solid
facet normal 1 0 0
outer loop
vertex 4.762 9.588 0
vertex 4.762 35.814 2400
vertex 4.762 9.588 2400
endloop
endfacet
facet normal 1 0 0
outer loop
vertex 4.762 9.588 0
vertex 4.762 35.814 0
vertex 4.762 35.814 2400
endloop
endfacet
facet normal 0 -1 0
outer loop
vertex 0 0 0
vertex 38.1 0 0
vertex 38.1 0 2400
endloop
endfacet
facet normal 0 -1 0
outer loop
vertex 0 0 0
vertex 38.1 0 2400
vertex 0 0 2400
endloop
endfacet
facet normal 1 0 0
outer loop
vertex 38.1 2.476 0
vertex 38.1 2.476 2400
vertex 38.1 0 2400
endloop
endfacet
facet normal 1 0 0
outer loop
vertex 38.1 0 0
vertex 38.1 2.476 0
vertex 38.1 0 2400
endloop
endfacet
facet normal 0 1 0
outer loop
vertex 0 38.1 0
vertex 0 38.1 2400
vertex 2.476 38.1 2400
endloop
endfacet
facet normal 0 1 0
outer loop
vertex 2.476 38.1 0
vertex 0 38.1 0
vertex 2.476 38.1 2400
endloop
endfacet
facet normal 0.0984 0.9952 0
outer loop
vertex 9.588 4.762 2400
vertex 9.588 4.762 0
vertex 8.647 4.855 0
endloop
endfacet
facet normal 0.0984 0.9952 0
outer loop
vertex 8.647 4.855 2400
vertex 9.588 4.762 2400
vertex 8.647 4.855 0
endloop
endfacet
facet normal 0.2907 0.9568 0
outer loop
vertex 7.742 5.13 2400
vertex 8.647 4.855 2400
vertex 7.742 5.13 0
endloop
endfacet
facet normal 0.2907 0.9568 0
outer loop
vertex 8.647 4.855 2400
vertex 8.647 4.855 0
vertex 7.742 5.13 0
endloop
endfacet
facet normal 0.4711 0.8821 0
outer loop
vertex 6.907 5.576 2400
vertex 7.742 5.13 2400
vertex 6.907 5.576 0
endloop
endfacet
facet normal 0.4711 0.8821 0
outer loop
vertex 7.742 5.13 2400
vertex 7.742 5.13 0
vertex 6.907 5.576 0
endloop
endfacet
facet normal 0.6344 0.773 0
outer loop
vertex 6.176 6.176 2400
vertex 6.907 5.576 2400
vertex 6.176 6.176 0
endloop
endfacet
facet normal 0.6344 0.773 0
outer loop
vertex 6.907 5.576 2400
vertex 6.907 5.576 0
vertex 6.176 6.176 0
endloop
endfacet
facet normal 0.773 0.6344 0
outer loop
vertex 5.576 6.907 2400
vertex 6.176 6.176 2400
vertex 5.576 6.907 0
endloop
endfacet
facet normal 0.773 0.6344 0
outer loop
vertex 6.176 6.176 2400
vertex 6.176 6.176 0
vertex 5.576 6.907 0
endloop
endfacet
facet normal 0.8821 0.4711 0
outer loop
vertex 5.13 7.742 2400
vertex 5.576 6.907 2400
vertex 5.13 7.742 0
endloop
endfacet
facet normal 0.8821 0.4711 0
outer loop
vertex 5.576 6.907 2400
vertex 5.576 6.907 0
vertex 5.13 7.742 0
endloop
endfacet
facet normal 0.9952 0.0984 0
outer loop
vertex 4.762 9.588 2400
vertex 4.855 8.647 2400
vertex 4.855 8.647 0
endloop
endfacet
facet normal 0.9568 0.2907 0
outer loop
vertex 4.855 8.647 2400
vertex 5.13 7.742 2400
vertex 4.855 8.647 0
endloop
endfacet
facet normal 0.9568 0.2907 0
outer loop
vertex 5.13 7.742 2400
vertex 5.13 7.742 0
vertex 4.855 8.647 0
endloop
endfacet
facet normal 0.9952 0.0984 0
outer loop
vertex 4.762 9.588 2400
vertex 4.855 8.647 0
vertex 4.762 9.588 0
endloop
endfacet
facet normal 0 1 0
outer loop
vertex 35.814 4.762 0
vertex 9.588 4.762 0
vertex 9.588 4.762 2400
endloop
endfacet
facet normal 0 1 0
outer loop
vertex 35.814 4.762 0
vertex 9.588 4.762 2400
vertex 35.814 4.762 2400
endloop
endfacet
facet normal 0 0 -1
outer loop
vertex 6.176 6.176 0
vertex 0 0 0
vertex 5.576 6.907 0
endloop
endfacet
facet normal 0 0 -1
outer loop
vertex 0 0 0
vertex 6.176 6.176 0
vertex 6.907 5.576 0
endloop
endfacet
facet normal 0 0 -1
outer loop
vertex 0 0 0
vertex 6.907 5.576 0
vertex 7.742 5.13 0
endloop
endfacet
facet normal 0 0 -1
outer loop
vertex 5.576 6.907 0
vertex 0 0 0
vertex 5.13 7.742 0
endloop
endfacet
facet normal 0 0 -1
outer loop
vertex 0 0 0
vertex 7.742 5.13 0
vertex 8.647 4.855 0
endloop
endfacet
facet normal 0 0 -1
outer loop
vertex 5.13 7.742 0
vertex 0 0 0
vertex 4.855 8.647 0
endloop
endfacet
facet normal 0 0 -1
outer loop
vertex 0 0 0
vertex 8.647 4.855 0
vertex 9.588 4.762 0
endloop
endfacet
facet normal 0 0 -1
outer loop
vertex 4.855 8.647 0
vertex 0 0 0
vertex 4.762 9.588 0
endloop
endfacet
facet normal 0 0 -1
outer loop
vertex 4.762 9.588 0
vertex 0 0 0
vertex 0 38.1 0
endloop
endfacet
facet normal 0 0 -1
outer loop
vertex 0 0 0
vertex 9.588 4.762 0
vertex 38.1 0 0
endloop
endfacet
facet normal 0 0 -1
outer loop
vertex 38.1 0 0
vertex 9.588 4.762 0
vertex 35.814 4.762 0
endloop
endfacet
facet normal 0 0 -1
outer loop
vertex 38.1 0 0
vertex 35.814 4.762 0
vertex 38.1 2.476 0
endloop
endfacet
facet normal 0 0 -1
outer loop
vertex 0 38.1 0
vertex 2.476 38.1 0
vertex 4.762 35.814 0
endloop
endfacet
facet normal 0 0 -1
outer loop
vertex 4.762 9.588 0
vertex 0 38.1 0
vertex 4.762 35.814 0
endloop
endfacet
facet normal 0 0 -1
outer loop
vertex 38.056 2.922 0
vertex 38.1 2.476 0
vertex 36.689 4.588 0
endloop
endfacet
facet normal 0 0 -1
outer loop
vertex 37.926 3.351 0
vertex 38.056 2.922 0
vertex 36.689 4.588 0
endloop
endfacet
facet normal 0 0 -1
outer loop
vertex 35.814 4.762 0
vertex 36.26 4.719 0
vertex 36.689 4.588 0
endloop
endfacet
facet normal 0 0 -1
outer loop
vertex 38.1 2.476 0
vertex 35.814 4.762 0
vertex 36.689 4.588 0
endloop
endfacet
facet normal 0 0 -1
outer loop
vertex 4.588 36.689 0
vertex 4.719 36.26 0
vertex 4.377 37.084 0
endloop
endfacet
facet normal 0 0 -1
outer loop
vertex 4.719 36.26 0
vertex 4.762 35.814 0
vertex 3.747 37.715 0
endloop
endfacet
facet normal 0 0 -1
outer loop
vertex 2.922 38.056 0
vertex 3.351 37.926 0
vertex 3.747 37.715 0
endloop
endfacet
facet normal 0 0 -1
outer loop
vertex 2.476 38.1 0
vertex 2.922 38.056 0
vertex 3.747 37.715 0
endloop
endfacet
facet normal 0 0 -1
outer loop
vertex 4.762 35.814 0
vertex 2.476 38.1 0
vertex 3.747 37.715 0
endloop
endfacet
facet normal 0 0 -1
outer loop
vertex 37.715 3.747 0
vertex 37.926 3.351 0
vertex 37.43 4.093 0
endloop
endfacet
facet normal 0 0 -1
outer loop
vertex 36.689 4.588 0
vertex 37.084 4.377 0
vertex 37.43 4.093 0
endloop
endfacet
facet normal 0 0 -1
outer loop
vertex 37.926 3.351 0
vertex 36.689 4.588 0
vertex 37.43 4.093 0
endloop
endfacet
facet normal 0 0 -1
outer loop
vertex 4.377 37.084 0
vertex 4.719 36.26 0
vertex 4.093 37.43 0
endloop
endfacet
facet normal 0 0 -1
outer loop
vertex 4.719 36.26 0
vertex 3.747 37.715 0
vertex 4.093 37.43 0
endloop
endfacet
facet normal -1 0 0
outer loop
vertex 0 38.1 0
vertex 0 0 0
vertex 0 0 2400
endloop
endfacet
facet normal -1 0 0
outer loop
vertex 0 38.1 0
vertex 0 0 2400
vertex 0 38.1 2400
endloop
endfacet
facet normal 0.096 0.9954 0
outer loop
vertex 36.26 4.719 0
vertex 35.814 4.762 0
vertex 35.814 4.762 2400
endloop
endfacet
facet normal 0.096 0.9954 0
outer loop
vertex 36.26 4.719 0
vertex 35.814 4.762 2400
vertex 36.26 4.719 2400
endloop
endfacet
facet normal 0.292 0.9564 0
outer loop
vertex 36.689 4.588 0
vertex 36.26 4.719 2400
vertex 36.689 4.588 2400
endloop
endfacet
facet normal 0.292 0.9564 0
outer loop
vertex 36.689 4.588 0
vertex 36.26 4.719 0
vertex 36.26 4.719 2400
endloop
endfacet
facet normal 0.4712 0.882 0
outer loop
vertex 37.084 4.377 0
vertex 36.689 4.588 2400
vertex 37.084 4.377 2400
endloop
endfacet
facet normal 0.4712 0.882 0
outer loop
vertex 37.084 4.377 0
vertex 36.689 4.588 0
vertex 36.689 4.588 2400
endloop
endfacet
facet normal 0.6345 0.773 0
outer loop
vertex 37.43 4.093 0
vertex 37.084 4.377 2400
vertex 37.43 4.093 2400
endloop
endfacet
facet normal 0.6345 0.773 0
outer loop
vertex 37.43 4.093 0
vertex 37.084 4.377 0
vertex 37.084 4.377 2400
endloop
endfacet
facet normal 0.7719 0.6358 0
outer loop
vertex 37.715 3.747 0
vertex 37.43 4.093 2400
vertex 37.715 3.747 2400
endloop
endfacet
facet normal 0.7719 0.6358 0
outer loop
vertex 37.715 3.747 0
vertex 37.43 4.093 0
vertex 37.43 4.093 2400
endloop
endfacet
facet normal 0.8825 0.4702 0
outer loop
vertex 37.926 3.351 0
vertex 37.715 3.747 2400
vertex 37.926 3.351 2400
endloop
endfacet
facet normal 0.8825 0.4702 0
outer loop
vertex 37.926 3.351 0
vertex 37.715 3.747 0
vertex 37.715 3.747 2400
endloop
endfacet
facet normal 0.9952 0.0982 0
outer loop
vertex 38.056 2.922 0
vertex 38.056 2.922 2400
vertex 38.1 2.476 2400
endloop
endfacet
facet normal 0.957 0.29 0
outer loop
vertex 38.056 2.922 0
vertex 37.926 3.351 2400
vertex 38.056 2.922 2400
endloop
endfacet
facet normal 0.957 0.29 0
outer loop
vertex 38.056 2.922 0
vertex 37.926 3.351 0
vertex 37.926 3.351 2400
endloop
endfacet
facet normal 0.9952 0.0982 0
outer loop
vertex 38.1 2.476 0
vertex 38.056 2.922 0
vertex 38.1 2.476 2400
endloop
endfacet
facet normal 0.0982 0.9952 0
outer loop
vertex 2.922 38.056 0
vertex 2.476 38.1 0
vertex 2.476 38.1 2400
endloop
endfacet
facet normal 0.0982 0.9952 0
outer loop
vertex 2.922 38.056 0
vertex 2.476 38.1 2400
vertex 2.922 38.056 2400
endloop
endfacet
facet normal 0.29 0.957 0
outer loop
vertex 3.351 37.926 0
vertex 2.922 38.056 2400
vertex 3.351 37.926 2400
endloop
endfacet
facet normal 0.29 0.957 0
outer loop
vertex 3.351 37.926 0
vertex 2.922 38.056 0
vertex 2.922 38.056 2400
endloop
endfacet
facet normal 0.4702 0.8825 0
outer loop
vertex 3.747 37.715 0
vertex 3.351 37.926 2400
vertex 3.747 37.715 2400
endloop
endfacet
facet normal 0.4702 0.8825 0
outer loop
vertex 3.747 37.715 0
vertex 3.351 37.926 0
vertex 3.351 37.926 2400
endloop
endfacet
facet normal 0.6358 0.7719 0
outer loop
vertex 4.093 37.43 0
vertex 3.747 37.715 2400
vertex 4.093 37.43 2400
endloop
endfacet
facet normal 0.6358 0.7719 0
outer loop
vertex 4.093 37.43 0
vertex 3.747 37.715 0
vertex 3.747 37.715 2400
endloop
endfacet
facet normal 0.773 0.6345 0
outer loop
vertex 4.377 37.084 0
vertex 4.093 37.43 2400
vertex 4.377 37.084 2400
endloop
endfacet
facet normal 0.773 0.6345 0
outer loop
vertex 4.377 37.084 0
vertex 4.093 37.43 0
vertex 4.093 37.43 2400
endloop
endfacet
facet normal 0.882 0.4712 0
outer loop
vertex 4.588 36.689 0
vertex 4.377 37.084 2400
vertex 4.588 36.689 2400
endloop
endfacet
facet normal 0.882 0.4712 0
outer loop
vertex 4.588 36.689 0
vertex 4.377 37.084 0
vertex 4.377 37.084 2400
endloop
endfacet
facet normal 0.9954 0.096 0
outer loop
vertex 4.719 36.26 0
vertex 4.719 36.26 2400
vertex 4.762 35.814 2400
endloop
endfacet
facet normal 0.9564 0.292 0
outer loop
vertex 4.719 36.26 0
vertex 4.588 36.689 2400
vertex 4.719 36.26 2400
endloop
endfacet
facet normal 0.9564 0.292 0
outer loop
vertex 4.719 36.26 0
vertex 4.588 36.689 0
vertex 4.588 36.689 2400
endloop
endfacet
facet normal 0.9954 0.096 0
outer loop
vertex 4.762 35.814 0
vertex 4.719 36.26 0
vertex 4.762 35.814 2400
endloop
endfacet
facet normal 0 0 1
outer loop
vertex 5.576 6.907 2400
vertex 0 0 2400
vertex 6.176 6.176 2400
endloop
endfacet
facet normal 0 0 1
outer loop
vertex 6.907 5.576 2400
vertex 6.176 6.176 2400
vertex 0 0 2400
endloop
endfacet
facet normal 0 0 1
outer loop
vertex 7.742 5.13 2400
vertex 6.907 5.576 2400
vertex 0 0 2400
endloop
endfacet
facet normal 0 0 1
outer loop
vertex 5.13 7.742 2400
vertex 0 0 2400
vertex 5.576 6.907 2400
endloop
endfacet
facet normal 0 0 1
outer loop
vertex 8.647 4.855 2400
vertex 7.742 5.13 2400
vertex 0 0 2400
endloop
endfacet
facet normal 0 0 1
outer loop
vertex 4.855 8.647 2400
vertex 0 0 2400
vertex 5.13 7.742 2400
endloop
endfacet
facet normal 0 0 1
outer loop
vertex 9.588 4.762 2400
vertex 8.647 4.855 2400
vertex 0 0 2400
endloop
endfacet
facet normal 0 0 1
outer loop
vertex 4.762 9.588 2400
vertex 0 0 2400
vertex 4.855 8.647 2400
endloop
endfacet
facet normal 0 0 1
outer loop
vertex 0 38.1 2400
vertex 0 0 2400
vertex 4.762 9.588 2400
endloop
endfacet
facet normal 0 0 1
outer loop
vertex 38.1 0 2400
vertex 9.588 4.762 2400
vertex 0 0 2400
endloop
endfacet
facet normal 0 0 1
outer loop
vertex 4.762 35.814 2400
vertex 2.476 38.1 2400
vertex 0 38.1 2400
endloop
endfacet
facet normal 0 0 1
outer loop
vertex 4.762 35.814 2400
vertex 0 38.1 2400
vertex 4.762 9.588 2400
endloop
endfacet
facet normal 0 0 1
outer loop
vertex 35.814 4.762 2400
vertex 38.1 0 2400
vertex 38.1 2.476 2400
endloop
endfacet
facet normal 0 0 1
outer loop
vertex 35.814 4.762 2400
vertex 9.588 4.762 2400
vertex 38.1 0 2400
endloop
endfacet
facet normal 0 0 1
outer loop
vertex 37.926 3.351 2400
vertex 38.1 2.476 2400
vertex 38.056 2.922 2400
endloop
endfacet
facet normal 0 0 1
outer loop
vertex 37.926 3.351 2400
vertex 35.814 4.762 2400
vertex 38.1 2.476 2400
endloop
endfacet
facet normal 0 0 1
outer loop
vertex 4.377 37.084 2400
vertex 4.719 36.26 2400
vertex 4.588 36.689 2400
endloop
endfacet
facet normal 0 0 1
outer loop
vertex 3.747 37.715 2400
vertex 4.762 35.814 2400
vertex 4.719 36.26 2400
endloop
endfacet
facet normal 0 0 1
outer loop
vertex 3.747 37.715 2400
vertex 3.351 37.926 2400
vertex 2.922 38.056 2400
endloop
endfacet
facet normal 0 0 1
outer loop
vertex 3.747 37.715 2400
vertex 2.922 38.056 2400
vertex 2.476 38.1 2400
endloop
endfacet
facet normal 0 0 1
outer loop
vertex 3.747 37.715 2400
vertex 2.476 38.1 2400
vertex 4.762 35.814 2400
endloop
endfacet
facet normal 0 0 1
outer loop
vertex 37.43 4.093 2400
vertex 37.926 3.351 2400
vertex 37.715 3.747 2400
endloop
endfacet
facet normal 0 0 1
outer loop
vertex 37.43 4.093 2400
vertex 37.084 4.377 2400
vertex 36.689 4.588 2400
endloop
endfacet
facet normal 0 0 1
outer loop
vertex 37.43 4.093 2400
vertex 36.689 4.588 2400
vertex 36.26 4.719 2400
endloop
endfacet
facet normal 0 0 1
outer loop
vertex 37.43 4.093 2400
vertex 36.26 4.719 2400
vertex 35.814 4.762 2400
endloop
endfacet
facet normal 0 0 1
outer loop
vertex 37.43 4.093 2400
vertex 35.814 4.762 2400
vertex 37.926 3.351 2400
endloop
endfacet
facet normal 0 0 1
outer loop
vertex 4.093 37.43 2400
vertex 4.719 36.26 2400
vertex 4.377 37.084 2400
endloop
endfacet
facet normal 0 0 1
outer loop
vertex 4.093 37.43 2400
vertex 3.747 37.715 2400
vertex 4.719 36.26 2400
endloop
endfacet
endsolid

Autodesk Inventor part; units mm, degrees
ref_plane "Plano inicial" through (0, 0, 0) normal (0, 0, 1) x (1, 0, 0)
ref_plane "Plano final" through (0, 0, 2400) normal (0, 0, 1) x (1, 0, 0)
sketch "Boceto" plane through (0, 0, 0) normal (0, 0, 1) x (1, 0, 0)
  line L0 (38.1, 0) -> (0, 0)
  line L1 (0, 0) -> (0, 38.1)
  line L2 (0, 38.1) -> (2.4765, 38.1)
  line L3 (4.7625, 35.814) -> (4.7625, 9.5885)
  line L4 (9.5885, 4.7625) -> (35.814, 4.7625)
  line L5 (38.1, 2.4765) -> (38.1, 0)
  line L6 (0, -11.0414) -> (0, 31.5385) construction
  line L7 (-11.0414, 0) -> (31.5385, 0) construction
  arc A0 (4.7625, 9.5885) -> (9.5885, 4.7625) centre (9.5885, 9.5885) ccw
  arc A1 (4.7625, 35.814) -> (2.4765, 38.1) centre (2.4765, 35.814) ccw
  arc A2 (38.1, 2.4765) -> (35.814, 4.7625) centre (35.814, 2.4765) ccw
  line L8 (0, 48.4964) -> (0, -20.9644) construction
  line L9 (-20.9644, 0) -> (48.4964, 0) construction
  point P0 (4.7625, 38.1)
  point P1 (4.7625, 4.7625)
  point P2 (38.1, 4.7625)
  dimension "d0" = 38.1
  dimension "d1" = 38.1
  dimension "d2" = 4.7625
  dimension "d3" = 4.7625
  dimension "d10" = 0
  dimension "d11" = 0
  dimension "d14" = 4.826
  dimension "d15" = 2.286
extrude "Cuerpo" add sketch "Boceto" along normal up to surface (2400 mm away) from surface at 0
sketch "Sketch3" plane through (0, 0, 0) normal (0, 0, 1) x (1, 0, 0)
  line L0 (0, 0) -> (10, 0)
ref_plane "Work Plane3" through (0, 0, 0) normal (0, -1, 0) x (1, 0, 0)
sketch "Sketch4" plane through (0, 0, 0) normal (0, -1, 0) x (1, 0, 0)
  line L0 (-2, 0) -> (12, 0)
  line L1 (-2, 2400) -> (12, 2400)
  dimension "d17" = 2400
sketch "Boceto5" plane through (0, 0, 2400) normal (0, 0, 1) x (1, 0, 0)
  line L0 (0, 0) -> (0, 38.1) projected
  circle A0 centre (0, 0) radius 57.437
ref_plane "Plano de trabajo4" through (4.8672, 4.8672, 1401) normal (0, 0, 1) x (1, 0, 0)
equation "\"d0\" = G_H"
equation "\"d1\" = G_H"
equation "\"d2\" = G_T"
equation "\"d3\" = G_T"
equation "\"d14\" = G_IR"
equation "\"d15\" = G_ER"
equation "\"d4\" = G_L"
equation "\"G_H\" = 38.1"
equation "\"G_T\" = 4.7625"
equation "\"G_ER\" = 2.286"
equation "\"G_IR\" = 4.826"
equation "\"G_L\" = d17"
equation "\"ex\" = 0"
equation "\"G_OFFSET_START\" = 0"
equation "\"G_OFFSET_END\" = 0"
properties part number "AISC - L 1,5 x 1,5 x 3/16 - 94,488" material "Acero, suave"
